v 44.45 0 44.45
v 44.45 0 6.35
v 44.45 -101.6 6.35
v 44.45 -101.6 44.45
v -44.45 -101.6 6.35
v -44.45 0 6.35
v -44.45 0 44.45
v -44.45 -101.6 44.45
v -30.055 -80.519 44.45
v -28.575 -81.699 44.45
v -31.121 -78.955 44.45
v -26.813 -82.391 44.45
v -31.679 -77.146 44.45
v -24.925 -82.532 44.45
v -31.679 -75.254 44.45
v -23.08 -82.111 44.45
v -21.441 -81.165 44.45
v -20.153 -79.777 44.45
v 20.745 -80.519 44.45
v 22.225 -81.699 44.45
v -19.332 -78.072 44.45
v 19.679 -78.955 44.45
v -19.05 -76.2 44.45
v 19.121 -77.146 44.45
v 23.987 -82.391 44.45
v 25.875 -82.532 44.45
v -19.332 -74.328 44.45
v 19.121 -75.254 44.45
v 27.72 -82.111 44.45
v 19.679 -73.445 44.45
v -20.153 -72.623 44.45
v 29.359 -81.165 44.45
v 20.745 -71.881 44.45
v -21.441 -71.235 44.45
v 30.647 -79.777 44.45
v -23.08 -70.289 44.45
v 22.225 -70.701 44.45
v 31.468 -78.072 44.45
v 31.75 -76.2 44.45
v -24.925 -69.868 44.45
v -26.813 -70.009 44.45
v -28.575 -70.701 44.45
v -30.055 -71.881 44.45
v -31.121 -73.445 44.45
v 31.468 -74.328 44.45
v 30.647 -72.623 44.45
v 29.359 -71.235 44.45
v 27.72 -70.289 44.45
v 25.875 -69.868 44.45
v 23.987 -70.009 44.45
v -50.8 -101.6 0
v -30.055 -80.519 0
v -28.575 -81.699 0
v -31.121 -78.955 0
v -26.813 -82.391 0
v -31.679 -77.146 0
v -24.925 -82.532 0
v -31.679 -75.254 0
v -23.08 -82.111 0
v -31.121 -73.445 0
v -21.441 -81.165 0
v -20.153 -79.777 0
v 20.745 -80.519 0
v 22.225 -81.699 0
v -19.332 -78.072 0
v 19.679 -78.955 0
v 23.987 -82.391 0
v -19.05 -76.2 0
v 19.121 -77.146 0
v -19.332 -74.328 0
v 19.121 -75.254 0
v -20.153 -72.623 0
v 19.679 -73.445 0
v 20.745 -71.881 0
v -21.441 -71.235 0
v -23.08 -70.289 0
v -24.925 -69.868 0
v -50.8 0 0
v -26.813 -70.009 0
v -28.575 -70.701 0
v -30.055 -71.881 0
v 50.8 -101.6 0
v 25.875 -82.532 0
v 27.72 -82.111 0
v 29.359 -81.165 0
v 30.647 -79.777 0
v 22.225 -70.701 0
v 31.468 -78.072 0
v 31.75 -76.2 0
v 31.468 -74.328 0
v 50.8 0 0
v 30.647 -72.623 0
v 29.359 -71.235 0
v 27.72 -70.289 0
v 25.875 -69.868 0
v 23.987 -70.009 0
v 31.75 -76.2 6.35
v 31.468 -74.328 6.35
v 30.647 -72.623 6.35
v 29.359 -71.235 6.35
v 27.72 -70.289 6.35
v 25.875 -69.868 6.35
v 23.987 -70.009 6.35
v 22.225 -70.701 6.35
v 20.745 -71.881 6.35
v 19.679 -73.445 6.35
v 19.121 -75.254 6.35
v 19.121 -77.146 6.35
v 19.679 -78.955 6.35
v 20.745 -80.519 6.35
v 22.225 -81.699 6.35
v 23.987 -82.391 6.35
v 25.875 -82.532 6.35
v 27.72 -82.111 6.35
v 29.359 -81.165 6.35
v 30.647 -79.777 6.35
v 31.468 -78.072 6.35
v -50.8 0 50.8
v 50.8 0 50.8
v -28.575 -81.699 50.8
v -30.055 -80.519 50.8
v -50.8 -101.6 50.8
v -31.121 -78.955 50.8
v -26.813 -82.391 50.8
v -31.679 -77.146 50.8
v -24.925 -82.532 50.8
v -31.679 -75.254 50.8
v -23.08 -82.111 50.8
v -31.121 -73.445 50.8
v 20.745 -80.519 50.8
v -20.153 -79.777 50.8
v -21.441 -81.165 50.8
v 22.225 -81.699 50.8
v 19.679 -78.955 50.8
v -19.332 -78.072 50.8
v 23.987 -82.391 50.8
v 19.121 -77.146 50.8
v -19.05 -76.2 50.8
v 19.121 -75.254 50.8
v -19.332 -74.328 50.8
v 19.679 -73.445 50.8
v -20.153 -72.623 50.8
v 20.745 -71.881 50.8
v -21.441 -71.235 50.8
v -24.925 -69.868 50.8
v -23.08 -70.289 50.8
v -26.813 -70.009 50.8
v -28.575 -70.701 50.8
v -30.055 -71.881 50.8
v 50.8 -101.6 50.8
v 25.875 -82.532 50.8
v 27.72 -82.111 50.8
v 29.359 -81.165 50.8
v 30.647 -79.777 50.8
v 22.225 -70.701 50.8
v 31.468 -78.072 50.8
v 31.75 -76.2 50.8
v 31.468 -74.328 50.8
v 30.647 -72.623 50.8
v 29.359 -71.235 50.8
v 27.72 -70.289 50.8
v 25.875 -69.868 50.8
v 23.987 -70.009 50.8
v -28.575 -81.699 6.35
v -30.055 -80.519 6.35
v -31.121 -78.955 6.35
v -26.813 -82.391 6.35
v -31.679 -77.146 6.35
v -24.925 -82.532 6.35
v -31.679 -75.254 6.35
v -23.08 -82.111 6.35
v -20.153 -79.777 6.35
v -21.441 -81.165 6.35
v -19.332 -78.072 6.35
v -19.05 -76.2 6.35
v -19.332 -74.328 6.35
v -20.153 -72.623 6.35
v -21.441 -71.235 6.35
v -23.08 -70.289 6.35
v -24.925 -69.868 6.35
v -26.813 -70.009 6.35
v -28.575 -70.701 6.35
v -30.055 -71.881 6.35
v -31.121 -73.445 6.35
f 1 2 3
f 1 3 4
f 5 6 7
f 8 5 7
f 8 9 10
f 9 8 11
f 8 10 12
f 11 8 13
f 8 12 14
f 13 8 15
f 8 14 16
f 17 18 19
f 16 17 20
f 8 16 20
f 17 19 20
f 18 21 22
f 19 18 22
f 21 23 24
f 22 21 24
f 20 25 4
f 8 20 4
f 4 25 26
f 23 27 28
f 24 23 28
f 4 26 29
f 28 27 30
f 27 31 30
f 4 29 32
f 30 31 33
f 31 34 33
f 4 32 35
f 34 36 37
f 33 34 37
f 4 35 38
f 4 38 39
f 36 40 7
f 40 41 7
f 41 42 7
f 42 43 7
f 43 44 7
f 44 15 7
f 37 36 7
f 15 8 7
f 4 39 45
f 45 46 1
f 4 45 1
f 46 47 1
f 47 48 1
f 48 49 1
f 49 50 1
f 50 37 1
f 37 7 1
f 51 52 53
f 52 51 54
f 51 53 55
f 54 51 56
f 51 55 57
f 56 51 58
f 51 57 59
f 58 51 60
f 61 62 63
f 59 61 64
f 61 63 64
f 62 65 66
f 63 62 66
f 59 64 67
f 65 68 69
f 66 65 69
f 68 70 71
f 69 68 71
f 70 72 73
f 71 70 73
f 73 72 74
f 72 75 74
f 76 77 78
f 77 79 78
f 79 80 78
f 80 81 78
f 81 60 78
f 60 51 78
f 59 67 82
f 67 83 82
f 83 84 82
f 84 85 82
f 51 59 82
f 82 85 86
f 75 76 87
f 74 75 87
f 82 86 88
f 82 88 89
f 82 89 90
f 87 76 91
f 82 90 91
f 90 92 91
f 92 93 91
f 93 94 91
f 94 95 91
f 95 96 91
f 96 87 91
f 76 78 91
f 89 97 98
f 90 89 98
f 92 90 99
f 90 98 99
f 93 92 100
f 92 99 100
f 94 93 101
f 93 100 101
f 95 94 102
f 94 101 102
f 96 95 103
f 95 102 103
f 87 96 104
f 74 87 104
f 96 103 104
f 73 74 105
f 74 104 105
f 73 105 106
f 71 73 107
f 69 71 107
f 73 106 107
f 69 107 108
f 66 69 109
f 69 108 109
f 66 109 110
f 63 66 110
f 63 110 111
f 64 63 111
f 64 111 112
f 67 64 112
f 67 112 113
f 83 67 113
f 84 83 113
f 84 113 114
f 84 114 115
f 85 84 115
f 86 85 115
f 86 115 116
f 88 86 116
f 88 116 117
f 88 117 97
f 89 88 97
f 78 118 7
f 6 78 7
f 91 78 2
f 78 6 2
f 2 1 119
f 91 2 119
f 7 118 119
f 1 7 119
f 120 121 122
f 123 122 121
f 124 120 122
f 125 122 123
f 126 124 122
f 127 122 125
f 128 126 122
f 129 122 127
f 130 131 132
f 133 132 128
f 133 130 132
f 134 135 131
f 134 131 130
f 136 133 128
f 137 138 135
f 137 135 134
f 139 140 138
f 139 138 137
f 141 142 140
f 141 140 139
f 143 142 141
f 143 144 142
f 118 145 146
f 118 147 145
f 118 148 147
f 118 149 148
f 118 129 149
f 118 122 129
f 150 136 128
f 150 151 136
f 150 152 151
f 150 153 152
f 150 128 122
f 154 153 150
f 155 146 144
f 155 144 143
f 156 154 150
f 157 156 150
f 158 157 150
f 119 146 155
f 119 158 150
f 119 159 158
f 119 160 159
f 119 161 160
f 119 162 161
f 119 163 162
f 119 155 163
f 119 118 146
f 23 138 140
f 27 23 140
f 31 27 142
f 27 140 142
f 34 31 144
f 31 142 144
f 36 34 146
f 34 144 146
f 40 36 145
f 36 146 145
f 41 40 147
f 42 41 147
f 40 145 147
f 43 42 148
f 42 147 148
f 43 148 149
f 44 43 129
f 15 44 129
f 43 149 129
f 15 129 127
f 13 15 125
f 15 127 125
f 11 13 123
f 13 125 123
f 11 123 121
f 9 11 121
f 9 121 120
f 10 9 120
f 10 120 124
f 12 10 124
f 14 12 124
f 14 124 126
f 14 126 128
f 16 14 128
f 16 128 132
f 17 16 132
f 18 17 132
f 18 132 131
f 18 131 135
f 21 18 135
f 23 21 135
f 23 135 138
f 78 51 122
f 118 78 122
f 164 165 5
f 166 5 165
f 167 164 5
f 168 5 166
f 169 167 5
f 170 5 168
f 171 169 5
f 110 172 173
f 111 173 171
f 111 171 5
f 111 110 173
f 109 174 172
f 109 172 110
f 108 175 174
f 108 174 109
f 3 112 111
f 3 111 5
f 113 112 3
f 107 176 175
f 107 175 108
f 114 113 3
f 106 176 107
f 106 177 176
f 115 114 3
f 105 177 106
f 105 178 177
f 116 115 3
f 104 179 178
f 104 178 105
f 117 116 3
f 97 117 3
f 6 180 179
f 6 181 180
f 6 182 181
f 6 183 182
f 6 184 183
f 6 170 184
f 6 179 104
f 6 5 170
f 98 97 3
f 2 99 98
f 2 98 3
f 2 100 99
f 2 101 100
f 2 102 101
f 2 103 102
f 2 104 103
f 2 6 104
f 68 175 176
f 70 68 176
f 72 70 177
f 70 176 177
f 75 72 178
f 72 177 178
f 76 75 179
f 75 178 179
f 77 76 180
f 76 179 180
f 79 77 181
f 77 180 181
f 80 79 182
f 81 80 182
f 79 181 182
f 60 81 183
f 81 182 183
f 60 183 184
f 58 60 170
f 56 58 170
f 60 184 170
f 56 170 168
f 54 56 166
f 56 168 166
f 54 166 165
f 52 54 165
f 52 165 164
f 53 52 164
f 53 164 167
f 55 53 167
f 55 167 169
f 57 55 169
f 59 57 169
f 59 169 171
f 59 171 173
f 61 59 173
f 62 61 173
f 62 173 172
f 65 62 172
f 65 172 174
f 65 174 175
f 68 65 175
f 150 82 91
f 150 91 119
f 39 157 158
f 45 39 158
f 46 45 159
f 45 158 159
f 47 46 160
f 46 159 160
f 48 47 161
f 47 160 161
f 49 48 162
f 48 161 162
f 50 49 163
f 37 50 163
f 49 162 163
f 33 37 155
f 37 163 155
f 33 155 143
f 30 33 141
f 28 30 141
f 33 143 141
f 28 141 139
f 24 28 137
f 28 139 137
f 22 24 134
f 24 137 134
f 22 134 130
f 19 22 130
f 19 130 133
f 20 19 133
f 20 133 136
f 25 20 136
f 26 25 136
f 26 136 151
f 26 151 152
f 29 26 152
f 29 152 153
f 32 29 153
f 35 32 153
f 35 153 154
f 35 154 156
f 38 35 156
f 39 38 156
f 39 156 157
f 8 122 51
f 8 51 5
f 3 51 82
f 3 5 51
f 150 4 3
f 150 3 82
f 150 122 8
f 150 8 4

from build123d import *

# Parameters (mm, degrees)
F0_W     = 101.6
F0_H     = 50.8
F0_W_2   = 88.9
F0_H_2   = 38.1
F1_DEPTH = 101.6
F2_R     = 6.35
F3_DEPTH = 50.801


with BuildPart() as f1:
    # F0 (on Front) → F1 (new body)
    with BuildSketch(Plane.XZ):
        with Locations((0, 25.4)):
            Rectangle(F0_W, F0_H)
        with Locations((0, 25.4)):
            Rectangle(F0_W_2, F0_H_2, mode=Mode.SUBTRACT)
    extrude(amount=F1_DEPTH)

    # F2 (on face) → F3 (cut, through all)
    with BuildSketch(Plane.XY.offset(50.8)):
        with Locations((25.4, -76.2)):
            Circle(F2_R)
        with Locations((-25.4, -76.2)):
            Circle(F2_R)
    extrude(amount=-F3_DEPTH, mode=Mode.SUBTRACT)


solid = f1.part
